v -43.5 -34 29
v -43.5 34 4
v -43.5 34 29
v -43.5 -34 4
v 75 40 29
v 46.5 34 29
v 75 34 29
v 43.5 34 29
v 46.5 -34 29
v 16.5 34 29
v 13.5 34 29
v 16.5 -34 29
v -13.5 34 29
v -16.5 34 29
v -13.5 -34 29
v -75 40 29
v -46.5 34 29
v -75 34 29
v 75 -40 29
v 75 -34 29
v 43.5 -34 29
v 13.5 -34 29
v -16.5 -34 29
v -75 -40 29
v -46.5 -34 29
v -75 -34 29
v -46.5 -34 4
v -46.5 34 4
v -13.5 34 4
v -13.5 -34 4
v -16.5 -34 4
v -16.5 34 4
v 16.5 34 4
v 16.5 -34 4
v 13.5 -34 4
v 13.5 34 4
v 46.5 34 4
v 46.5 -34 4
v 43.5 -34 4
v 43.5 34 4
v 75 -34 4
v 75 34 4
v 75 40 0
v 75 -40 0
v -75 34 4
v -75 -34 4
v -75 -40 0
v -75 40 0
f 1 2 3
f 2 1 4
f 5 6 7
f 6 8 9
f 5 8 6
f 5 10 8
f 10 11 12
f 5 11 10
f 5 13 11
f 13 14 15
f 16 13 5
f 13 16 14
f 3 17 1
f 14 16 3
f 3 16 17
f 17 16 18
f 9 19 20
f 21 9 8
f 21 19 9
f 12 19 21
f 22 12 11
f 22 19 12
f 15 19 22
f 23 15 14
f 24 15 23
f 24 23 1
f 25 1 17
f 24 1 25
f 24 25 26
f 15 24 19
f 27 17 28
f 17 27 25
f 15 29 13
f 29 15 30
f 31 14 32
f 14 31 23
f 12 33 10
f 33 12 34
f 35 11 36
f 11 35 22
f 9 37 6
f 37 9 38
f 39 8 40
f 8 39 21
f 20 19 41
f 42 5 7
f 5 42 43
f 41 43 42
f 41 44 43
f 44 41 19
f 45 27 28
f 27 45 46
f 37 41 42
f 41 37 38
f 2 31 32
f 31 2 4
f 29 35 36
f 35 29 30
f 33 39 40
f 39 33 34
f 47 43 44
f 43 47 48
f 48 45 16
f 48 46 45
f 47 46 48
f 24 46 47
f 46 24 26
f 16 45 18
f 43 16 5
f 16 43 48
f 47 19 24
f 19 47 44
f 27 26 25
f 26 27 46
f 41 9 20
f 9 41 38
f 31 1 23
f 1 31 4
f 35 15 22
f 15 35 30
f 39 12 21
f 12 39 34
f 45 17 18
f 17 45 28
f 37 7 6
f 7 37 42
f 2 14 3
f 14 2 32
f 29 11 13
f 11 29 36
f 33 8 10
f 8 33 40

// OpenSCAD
$fn = 32;

// ----------------------------------------------------------------------
// Rib frame 150 x 80 x 29
// 4 ribs at 30 mm pitch
// ----------------------------------------------------------------------

// --- parameters (mm) ---
frame = [150, 80, 4];  // base plate size (x, y, z)
rail_w = 6;            // side rail width
ribs = 4;              // number of ribs
rib_t = 3;             // rib thickness
rib_h = 25;            // rib height above the base plate
pitch = 30;            // pitch between rib centres

// --- derived feature positions (mm) ---
span = (ribs - 1) * pitch;          // = 90   distance between the outer ribs
origin_x = -span / 2;               // = -45   X of the first rib
rib_len = frame[1] - 2 * rail_w + 2;  // = 70   rib length, 1 mm into each rail
feature_centers = [
  [origin_x + 0 * pitch, 0],
  [origin_x + 1 * pitch, 0],
  [origin_x + 2 * pitch, 0],
  [origin_x + 3 * pitch, 0]
];   // rib centre line, drives the rib loop

// base plate, two side rails, then the ribs read straight off feature_centers
union() {
  translate([-frame[0] / 2, -frame[1] / 2, 0]) cube(frame);
  translate([-frame[0] / 2, -frame[1] / 2, 0]) cube([frame[0], rail_w, frame[2] + rib_h]);
  translate([-frame[0] / 2, frame[1] / 2 - rail_w, 0]) cube([frame[0], rail_w, frame[2] + rib_h]);
  for (centre = feature_centers)
    translate([centre[0] - rib_t / 2, centre[1] - rib_len / 2, frame[2] - 1])
      cube([rib_t, rib_len, rib_h + 1]);
}
